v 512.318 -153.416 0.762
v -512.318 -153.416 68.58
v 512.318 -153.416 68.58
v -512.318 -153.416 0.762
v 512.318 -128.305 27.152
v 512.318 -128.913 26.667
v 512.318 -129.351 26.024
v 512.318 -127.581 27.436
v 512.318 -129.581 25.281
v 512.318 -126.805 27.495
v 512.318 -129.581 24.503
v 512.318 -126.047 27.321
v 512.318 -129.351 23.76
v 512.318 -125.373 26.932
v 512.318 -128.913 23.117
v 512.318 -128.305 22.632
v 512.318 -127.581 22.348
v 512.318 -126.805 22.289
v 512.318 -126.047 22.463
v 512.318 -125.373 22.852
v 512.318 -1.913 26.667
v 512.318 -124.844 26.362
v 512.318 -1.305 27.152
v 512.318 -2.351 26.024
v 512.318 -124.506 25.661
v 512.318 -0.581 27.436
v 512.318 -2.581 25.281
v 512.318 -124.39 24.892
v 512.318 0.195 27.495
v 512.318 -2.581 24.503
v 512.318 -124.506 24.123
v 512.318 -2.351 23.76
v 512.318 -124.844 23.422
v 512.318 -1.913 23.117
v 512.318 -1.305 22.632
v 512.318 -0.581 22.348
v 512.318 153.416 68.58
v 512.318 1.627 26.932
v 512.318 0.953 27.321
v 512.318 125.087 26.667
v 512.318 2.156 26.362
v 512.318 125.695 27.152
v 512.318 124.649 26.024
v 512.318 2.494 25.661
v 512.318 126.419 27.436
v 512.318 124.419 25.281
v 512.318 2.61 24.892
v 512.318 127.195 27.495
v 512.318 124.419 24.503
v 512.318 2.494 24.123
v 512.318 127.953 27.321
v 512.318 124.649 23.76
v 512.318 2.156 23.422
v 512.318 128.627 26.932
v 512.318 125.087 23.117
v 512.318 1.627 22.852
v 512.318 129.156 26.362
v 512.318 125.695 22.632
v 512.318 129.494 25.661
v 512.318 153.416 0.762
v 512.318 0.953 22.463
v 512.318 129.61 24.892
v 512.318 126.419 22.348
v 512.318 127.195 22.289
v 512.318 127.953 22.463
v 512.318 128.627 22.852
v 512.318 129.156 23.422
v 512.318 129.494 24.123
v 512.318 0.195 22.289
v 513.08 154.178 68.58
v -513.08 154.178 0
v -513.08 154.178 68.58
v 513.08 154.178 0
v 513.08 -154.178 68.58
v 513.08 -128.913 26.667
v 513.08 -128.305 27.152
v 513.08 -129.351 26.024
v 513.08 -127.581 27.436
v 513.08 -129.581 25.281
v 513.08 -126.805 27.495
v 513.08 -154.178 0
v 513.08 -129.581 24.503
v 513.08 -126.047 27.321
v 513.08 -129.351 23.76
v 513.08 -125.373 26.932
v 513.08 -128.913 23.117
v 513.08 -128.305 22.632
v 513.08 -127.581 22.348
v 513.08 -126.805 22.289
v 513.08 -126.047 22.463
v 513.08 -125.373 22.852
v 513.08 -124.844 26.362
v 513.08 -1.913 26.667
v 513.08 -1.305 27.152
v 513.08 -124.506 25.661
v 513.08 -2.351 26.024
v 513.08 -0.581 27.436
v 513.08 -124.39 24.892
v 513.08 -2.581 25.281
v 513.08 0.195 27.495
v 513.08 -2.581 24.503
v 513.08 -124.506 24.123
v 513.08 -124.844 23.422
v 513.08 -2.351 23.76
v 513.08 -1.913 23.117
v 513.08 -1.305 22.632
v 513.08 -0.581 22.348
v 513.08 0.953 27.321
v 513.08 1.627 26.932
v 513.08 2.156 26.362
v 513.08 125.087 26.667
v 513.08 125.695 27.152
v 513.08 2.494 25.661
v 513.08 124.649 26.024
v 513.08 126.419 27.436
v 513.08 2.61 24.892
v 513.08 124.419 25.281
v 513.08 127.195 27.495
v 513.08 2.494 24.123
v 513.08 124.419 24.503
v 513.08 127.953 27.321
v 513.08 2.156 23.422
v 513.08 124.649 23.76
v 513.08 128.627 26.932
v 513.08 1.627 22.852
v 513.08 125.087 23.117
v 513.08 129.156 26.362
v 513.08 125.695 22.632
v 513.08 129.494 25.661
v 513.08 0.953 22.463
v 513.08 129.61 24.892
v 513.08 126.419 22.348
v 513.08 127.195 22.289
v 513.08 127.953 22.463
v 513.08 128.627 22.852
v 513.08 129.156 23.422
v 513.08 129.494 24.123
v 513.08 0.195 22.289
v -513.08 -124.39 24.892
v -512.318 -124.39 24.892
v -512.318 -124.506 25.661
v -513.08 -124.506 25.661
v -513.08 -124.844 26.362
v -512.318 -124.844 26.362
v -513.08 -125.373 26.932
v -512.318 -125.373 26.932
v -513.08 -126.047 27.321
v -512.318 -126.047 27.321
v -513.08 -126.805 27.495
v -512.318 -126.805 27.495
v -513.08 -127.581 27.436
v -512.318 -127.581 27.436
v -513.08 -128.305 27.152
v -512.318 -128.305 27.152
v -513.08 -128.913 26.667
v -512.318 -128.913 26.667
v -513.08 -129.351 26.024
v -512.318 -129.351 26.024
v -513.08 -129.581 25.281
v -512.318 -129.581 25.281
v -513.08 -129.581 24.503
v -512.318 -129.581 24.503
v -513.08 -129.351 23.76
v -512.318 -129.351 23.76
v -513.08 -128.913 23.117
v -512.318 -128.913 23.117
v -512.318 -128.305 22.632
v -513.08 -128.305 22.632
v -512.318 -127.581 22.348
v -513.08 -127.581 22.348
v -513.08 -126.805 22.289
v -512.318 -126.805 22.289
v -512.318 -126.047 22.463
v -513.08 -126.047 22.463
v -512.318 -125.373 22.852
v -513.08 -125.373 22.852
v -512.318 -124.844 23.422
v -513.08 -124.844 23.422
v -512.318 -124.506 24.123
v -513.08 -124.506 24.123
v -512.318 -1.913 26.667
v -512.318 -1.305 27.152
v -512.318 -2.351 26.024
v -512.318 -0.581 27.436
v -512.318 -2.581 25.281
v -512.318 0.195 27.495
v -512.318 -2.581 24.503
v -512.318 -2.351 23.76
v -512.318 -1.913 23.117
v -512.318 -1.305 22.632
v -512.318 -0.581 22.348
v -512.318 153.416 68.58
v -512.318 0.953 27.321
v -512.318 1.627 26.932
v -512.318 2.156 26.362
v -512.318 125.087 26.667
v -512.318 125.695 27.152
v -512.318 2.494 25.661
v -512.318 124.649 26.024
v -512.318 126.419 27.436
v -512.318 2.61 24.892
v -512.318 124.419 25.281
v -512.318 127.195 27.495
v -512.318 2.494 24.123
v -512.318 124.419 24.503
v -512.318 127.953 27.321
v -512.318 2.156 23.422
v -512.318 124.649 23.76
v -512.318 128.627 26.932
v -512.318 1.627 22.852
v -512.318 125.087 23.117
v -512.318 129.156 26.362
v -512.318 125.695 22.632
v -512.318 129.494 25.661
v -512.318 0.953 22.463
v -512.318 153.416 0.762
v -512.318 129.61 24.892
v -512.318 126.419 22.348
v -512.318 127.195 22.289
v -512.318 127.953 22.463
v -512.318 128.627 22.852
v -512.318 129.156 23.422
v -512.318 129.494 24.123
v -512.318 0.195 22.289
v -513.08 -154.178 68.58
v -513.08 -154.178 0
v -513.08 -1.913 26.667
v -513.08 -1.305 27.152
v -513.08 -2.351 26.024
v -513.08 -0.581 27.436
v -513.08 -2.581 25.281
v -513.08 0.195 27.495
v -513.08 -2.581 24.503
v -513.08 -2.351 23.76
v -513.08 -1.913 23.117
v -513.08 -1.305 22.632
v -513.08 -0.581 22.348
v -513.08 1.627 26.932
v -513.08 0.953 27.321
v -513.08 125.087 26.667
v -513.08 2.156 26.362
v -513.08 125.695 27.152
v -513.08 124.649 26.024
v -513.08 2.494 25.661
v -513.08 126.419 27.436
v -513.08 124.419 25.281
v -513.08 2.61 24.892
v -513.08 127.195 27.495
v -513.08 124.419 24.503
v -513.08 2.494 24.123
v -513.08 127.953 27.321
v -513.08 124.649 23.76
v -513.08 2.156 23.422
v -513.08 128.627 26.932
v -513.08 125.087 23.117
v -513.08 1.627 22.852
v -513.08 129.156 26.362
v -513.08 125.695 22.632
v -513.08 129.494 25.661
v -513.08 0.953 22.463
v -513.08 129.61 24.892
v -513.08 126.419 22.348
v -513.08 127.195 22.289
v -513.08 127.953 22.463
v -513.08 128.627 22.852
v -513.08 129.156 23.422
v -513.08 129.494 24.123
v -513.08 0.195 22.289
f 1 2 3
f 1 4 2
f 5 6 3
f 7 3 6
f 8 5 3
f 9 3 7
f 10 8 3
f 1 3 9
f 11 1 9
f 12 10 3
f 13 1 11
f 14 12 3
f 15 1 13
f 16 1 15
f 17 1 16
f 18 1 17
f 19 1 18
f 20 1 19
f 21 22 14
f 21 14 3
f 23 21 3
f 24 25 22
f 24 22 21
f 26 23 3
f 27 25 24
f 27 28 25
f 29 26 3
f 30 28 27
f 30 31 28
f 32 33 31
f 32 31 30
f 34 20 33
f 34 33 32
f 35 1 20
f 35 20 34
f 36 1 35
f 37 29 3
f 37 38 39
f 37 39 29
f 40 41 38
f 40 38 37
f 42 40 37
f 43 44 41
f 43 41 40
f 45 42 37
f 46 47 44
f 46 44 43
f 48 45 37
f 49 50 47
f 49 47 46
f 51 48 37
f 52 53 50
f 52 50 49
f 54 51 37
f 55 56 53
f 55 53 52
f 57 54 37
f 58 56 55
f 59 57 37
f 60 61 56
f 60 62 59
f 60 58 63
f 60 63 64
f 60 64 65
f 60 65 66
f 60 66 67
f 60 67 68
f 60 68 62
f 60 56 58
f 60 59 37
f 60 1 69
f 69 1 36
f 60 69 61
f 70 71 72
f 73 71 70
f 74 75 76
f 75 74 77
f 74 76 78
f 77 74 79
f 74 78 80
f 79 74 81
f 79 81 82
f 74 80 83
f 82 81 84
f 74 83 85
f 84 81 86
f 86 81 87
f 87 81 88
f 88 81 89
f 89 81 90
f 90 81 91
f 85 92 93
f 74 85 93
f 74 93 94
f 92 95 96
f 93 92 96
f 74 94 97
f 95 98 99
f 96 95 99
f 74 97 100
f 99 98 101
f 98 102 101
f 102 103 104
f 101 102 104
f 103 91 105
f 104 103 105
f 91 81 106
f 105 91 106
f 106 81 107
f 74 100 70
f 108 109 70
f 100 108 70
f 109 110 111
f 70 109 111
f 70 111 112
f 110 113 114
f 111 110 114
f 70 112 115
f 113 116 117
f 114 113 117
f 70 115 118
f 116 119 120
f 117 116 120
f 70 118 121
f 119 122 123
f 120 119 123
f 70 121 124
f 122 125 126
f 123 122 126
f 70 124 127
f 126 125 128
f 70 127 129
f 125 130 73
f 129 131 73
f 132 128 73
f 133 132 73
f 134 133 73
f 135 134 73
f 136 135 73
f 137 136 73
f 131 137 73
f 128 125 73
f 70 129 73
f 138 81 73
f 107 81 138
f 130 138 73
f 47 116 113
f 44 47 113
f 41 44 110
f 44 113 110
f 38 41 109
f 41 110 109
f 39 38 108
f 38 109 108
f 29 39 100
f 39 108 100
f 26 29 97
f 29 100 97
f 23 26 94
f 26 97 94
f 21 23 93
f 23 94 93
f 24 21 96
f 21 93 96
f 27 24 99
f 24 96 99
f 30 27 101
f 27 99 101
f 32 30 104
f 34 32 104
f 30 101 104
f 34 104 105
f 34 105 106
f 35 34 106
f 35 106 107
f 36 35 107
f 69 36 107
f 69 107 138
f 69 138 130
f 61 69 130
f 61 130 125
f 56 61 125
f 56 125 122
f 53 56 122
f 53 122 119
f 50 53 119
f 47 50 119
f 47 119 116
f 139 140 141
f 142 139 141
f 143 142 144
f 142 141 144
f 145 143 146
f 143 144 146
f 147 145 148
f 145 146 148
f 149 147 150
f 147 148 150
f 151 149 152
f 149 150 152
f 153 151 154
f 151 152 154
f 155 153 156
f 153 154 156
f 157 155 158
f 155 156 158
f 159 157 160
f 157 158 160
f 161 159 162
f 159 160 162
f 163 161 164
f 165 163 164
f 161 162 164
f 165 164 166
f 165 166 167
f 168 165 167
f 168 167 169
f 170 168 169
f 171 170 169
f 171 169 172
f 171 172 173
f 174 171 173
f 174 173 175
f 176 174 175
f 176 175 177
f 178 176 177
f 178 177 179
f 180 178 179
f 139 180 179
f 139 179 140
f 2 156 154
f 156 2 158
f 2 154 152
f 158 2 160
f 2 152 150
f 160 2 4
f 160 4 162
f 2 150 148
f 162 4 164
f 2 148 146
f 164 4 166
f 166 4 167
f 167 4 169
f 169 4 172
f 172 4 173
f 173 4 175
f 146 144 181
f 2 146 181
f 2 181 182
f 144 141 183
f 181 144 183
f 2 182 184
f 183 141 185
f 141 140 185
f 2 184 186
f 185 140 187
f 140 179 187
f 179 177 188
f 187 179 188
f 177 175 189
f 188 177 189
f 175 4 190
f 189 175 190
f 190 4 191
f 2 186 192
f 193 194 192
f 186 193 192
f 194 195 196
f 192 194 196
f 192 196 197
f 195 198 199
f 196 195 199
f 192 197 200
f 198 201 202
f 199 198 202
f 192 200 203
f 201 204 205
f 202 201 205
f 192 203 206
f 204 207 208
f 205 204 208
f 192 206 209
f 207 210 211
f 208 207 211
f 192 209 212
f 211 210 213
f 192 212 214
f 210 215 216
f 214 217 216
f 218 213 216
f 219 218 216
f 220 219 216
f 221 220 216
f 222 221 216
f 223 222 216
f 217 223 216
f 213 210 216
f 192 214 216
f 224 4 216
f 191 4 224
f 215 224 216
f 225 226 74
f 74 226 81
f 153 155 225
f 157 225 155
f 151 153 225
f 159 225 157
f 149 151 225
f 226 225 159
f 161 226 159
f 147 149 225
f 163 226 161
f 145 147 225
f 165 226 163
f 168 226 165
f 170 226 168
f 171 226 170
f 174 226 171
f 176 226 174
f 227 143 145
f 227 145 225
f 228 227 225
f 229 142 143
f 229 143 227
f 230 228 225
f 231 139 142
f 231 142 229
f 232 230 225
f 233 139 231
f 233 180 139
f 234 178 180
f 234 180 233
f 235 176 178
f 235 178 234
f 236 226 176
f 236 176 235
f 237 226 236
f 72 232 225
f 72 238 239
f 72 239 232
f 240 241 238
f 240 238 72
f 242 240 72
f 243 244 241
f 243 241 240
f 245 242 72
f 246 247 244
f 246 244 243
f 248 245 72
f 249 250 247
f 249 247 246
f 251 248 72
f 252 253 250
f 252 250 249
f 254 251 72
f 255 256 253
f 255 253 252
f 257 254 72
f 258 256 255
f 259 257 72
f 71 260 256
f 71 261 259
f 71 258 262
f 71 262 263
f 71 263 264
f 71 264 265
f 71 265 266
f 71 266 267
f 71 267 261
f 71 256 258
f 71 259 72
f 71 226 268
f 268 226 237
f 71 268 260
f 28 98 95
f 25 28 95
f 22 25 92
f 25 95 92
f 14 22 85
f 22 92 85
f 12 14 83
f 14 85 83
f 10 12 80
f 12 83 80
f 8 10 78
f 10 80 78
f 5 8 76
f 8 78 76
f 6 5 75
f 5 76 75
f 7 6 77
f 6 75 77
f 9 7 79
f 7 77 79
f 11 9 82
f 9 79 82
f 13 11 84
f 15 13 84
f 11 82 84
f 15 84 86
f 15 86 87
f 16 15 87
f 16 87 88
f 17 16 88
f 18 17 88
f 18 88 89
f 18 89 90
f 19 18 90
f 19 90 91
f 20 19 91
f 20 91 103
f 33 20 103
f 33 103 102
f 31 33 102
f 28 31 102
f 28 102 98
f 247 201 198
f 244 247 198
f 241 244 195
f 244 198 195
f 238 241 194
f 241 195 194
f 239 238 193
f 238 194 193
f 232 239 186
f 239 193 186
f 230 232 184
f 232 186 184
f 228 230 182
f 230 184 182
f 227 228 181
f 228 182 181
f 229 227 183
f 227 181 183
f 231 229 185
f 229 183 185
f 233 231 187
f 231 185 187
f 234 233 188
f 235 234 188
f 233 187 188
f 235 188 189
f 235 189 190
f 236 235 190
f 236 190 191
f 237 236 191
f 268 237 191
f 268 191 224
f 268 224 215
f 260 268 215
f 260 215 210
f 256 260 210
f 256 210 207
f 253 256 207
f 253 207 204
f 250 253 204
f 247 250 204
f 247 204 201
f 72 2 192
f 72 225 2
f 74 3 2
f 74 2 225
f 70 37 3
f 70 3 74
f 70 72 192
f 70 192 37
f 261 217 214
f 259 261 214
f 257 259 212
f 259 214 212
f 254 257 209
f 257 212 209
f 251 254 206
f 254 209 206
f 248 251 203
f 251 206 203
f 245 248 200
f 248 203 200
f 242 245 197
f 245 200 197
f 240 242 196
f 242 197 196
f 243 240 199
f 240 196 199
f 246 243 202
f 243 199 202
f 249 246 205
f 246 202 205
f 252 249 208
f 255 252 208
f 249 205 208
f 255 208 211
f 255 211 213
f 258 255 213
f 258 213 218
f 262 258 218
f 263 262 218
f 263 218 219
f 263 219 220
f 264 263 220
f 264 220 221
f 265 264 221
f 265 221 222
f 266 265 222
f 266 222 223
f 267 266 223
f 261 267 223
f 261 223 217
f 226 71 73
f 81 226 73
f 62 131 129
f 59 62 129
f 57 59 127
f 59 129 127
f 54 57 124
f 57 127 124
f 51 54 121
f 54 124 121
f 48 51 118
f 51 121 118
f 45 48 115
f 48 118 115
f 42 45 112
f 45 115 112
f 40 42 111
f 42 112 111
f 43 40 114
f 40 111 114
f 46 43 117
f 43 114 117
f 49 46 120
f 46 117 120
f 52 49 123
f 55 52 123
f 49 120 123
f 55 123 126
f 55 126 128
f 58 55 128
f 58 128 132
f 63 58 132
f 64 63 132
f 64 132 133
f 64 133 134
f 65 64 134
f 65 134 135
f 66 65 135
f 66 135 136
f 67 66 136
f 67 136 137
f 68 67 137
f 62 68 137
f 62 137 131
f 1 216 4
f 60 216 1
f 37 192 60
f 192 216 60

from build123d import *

# Parameters (mm, degrees)
F0_W     = 1026.16
F0_H     = 308.356
F1_DEPTH = 68.58
F2_T     = -0.762
F4_D     = 5.2197


with BuildPart() as f1:
    # F0 (on Top) → F1 (new body)
    with BuildSketch(Plane.XY):
        Rectangle(F0_W, F0_H)
    extrude(amount=F1_DEPTH)

    # F2
    f2_openings = [f1.faces().sort_by_distance(p)[0] for p in [
        (0, 0, 68.58),
    ]]
    offset(amount=F2_T, openings=f2_openings)

    # F4 (through all)
    with Locations(Plane(origin=(-513.08, 0, 0), x_dir=(0, -1, 0), z_dir=(-1, 0, 0))):
        with Locations((-127, 24.892), (0, 24.892), (127, 24.892)):
            Hole(F4_D / 2)


solid = f1.part
